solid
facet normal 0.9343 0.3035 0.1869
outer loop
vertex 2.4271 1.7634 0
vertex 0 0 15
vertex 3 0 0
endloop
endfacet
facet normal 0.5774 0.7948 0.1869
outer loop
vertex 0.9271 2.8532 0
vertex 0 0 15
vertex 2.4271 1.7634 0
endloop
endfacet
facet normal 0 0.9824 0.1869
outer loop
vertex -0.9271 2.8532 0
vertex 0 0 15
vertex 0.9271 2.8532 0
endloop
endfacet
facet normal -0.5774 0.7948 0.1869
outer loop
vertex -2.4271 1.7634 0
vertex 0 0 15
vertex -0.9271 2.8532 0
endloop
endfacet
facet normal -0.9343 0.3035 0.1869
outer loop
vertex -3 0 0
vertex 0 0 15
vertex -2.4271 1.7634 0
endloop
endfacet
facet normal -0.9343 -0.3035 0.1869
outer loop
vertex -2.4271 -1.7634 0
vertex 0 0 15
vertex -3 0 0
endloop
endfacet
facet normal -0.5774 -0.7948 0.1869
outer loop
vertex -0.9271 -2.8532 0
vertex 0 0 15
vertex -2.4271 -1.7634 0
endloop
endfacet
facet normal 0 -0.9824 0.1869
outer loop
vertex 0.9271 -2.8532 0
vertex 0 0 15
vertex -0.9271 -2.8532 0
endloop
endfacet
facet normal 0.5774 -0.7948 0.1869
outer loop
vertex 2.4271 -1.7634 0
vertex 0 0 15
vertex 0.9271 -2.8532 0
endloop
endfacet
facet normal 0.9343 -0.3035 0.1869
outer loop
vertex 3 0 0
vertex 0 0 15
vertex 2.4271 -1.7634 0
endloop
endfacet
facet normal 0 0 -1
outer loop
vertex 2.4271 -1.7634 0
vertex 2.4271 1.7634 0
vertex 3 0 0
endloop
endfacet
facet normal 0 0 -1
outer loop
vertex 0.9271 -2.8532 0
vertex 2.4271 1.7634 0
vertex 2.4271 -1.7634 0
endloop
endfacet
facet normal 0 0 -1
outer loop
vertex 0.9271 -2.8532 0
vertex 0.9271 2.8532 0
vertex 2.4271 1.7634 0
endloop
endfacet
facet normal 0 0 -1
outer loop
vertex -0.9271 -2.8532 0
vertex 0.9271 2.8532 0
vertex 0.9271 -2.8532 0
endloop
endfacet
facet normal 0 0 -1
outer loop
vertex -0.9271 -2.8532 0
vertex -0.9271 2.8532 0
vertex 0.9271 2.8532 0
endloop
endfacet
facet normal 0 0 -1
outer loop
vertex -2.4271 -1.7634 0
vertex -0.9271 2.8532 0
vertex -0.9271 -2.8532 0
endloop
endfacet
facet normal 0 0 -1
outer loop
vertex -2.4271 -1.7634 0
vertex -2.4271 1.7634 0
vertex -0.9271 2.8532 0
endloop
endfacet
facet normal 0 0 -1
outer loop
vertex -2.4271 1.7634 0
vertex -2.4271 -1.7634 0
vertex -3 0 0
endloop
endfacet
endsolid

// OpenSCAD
// Generated by SolidPython 1.0.1 on 2020-07-29 00:46:43


cylinder(h = 15, r1 = 3, r2 = 0);
/***********************************************
*********      SolidPython code:      **********
************************************************
 
# import packages: SolidPython
from solid import *
from solid.utils import *
from itertools import chain, combinations, permutations


class Resize:

    def __init__(self, scad_file):
        self.scad_file = scad_file
        #self.scad_file = import_scad(scad_file)
        # cone/cylinder param:
        self.r1 = 0
        self.r2 = 0
        self.h = 0
        # rectangular prism param:
        self.w = 0
        self.l = 0
        # ellipse param:
        self.r = 0

    # import OpenScad code (file name corresponds to shape)


    # classify shape + parameters
    def assign(self, param1, param2, param3):
        if self.scad_file == 'cone.scad':
            self.r1 = param1
            self.r2 = param2
            self.h = param3
        elif self.scad_file == 'cylinder.scad':
            self.r1 = param1
            self.r2 = param2
            self.h = param3
        elif self.scad_file == 'rectangularPrism.scad':
            self.h = param1
            self.l = param2
            self.w = param3
        else:
            self.r = param1
            self.h = param2

    # resize parameters
    def iterate(self):
        x = range(3, 20, 2)
        i = 1
        if self.scad_file == 'cone.scad':
            tempList = list(permutations(x, 2))
            for temp in tempList:
                param1 = temp[0]
                param2 = temp[1]
                filepath = 'produced_scad_files/' + 'cone' + str(param1) + '_' + str(param2) + '_' + '.scad'
                scad_render_to_file(cylinder(h=param1, r1=param2, r2=0), filepath)

        elif self.scad_file == 'cylinder.scad':
            tempList = list(permutations(x, 3))
            for temp in tempList:
                param1 = temp[0]
                param2 = temp[1]
                filepath = 'produced_scad_files/' + 'cylinder' + str(param1) + '_' + str(param2) + '_' + '.scad'
                scad_render_to_file(cylinder(h=param1, r1=param2, r2=param2), filepath)

        elif self.scad_file == 'rectangularPrism.scad':
            tempList = list(permutations(x, 3))
            for temp in tempList:
                param1 = temp[0]
                param2 = temp[1]
                param3 = temp[2]
                filepath = 'produced_scad_files/' + 'rectangularPrism' + str(param1) + '_' + str(param2) + '_' + str(
                    param3) + '.scad'
                scad_render_to_file(cube(size=(param1, param2, param3)), filepath)

        elif self.scad_file == 'ellipse.scad':
            tempList = list(permutations(x, 4))
            for temp in tempList:
                param1 = temp[0]
                param2 = temp[1]
                param3 = temp[2]
                param4 = temp[3]
                filepath = 'produced_scad_files/' + 'ellipse' + str(param1) + '_' + str(param2) + '_' + str(param3) + '_' + str(param4) + '.scad'
                scad_render_to_file(scale([param1, param2, param3])(sphere(r=param4)), filepath)

    def render_to_scadfile(self):
        scad_render_to_file(scad, 'example.scad') 
 
************************************************/
